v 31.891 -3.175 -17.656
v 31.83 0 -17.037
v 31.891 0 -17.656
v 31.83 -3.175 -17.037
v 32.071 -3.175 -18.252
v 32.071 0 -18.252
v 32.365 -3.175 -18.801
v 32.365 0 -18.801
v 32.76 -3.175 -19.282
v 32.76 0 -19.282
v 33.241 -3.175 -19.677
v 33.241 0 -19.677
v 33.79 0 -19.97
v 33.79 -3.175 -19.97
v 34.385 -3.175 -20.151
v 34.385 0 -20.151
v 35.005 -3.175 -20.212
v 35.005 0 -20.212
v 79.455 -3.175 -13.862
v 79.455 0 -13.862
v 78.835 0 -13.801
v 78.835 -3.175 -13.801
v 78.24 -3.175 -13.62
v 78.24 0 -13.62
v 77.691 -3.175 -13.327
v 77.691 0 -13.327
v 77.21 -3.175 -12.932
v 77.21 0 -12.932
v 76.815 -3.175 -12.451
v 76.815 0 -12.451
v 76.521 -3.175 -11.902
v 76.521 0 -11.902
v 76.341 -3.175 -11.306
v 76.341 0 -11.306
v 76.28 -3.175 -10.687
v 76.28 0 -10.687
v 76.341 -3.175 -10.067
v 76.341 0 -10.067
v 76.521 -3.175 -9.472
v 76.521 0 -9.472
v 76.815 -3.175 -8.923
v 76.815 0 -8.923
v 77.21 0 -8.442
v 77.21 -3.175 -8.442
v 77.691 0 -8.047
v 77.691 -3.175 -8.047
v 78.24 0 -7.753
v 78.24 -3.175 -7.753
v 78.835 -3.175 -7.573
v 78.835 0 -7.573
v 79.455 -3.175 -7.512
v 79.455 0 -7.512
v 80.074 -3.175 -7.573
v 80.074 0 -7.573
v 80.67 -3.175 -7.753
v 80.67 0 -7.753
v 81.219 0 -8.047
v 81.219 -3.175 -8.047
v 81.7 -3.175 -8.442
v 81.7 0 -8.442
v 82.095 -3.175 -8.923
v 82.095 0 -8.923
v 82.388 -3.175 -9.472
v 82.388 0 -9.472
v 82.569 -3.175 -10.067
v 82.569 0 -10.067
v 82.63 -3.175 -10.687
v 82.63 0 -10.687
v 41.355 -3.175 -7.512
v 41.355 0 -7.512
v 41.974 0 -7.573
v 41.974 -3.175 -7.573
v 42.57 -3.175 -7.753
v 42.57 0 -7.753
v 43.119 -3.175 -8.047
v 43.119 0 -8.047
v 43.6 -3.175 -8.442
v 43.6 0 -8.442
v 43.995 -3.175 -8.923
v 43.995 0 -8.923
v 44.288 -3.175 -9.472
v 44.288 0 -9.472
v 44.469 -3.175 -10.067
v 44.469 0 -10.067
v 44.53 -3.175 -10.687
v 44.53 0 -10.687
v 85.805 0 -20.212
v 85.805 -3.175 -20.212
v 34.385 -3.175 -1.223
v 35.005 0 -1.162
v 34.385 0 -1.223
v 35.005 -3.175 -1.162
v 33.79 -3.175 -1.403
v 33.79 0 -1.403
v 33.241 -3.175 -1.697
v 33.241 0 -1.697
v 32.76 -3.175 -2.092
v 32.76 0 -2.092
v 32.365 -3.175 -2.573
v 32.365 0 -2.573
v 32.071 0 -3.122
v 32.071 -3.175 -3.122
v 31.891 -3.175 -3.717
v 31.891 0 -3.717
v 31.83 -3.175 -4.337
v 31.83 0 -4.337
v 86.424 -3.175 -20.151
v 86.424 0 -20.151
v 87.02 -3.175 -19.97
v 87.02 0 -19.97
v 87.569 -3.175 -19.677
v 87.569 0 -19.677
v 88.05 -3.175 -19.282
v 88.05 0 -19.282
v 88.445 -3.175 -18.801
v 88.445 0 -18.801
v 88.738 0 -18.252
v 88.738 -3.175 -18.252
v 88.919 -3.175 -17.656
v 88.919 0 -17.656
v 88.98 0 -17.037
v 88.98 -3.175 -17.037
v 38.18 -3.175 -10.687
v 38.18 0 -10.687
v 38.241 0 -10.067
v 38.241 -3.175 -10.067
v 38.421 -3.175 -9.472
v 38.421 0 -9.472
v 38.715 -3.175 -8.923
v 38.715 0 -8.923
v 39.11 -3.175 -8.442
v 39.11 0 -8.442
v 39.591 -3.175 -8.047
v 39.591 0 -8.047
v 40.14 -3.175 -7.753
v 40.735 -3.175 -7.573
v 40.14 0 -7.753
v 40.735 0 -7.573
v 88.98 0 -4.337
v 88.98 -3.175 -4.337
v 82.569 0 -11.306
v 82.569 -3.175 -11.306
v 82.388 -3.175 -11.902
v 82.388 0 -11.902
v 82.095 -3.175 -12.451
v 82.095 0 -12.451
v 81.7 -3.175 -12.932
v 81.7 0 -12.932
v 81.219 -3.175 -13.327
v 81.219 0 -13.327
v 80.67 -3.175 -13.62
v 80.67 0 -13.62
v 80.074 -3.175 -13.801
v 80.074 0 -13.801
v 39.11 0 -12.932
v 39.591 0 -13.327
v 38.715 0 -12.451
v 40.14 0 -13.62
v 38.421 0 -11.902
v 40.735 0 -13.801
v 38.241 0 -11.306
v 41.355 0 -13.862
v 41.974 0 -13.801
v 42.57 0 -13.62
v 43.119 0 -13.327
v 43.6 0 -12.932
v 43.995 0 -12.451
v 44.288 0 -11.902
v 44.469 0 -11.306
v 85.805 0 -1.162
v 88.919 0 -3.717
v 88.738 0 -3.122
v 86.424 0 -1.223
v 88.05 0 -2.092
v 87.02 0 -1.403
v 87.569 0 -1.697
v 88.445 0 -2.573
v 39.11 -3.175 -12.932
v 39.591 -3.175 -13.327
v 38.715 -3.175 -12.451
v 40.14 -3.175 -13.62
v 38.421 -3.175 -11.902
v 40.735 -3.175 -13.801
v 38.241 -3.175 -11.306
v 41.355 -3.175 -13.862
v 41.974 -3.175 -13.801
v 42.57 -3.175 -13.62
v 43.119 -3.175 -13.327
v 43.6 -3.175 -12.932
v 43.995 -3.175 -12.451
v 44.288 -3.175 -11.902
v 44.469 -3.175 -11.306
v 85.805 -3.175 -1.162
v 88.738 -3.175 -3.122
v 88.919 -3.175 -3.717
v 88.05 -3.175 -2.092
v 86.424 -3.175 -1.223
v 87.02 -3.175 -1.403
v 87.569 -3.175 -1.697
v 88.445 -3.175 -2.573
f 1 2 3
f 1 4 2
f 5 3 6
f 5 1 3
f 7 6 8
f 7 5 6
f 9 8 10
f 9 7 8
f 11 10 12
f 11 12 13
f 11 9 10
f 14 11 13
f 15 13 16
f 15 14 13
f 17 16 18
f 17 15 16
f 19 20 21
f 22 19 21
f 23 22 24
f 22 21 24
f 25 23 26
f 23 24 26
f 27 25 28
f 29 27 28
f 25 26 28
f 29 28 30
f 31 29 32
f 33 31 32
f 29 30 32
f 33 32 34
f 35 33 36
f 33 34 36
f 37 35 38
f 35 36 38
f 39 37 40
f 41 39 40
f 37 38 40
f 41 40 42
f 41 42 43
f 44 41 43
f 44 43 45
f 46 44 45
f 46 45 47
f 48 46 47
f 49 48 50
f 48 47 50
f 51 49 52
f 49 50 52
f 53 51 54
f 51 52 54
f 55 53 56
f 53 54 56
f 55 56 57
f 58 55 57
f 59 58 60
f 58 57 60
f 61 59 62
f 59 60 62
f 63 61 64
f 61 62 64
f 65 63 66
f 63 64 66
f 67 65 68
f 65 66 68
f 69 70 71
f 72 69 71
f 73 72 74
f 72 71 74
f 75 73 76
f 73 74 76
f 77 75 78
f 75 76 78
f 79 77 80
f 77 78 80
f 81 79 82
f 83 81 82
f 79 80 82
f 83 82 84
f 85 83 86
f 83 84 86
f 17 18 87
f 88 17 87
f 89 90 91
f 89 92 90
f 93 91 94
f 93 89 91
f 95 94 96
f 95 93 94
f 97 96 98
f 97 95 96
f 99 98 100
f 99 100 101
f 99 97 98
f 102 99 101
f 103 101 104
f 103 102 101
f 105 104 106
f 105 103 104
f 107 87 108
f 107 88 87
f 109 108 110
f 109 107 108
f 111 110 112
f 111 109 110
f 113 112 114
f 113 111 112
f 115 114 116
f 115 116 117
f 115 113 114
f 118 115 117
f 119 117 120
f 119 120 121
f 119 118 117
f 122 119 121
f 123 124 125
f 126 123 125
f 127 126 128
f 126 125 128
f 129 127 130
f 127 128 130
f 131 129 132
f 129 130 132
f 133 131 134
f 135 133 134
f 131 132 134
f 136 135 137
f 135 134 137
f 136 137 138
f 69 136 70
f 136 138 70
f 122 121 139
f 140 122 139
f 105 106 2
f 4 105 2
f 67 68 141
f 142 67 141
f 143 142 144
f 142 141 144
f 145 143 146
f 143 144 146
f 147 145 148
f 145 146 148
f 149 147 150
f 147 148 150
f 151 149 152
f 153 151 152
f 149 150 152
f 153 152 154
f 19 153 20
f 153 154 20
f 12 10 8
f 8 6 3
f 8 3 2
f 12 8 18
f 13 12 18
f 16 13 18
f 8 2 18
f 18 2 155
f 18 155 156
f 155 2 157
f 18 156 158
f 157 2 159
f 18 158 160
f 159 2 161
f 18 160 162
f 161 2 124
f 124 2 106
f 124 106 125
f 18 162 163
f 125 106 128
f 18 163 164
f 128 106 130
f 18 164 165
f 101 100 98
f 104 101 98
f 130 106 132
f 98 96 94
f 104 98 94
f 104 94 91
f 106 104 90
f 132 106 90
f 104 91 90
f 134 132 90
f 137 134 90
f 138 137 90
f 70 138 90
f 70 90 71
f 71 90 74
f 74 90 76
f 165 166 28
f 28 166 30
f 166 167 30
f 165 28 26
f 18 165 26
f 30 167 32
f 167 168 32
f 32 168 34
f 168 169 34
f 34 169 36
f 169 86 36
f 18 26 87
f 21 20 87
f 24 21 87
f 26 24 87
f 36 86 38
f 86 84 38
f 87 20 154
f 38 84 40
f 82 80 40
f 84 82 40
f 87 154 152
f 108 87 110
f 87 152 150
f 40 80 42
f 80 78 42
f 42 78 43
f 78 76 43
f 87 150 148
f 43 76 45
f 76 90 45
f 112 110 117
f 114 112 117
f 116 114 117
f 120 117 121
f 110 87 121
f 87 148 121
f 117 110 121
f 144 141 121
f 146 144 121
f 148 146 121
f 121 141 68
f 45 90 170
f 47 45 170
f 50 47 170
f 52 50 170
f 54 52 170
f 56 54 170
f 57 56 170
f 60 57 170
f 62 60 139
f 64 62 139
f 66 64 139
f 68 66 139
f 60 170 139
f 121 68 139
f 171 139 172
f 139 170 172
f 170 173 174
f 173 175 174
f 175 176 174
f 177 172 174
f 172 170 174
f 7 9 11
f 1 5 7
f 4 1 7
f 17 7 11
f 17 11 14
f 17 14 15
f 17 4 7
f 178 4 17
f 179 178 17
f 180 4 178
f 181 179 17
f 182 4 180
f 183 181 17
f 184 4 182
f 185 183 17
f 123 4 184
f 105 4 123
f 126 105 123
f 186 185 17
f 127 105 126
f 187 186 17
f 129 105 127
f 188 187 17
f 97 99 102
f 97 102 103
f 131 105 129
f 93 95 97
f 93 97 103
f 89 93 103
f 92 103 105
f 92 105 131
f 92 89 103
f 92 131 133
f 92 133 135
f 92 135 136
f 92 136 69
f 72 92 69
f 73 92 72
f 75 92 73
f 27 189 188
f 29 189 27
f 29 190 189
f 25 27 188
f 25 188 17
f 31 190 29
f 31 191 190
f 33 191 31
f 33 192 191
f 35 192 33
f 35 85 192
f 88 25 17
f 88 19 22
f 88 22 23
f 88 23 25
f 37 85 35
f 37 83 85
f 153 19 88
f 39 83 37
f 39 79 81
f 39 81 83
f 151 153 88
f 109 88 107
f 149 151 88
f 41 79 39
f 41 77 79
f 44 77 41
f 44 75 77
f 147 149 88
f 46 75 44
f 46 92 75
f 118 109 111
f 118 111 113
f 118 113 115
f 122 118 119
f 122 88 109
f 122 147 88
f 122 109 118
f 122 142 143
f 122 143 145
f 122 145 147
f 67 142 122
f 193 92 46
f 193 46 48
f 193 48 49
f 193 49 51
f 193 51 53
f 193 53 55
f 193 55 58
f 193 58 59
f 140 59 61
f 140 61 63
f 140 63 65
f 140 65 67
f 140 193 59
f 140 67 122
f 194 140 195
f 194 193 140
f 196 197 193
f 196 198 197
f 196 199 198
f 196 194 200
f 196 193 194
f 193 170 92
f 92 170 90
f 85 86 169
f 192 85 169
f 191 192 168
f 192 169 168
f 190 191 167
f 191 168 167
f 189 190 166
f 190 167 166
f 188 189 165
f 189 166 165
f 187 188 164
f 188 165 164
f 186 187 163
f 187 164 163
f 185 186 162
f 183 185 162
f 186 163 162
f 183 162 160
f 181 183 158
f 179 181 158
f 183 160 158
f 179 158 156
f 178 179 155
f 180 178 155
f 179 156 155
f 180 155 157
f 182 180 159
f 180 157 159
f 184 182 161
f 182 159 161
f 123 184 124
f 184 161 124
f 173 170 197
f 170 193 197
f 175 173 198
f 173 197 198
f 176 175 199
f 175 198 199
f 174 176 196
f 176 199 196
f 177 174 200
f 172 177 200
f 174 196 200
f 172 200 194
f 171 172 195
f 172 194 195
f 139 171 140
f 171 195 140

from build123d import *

# Parameters (mm, degrees)
F1_DEPTH = 3.175
F2_R     = 3.175


with BuildPart() as f1:
    # F0 (on Front) → F1 (new body)
    with BuildSketch(Plane.XZ):
        with BuildLine():
            Line((88.979729, -1.161793), (41.354729, -1.161793))
            Line((41.354729, -1.161793), (41.354729, -7.511793))
            ThreePointArc((41.354729, -7.511793), (43.599793, -8.441729), (44.529729, -10.686793))
            ThreePointArc((44.529729, -10.686793), (41.354729, -13.861793), (38.179729, -10.686793))
            Line((38.179729, -10.686793), (31.829729, -10.686793))
            Line((31.829729, -10.686793), (31.829729, -20.211793))
            Line((31.829729, -20.211793), (79.454729, -20.211793))
            Line((79.454729, -20.211793), (79.454729, -13.861793))
            ThreePointArc((79.454729, -13.861793), (77.209664, -8.441729), (82.629729, -10.686793))
            Line((82.629729, -10.686793), (88.979729, -10.686793))
            Line((88.979729, -10.686793), (88.979729, -1.161793))
        make_face()
        with BuildLine():
            Line((41.354729, -1.161793), (31.829729, -1.161793))
            Line((31.829729, -1.161793), (31.829729, -10.686793))
            Line((31.829729, -10.686793), (38.179729, -10.686793))
            ThreePointArc((38.179729, -10.686793), (39.109664, -8.441729), (41.354729, -7.511793))
            Line((41.354729, -7.511793), (41.354729, -1.161793))
        make_face()
        with BuildLine():
            Line((88.979729, -20.211793), (88.979729, -10.686793))
            Line((88.979729, -10.686793), (82.629729, -10.686793))
            ThreePointArc((82.629729, -10.686793), (81.699793, -12.931858), (79.454729, -13.861793))
            Line((79.454729, -13.861793), (79.454729, -20.211793))
            Line((79.454729, -20.211793), (88.979729, -20.211793))
        make_face()
    extrude(amount=F1_DEPTH)

    # F2
    f2_edges = [f1.edges().sort_by_distance(p)[0] for p in [
        (31.829729, -1.5875, -1.161793),
        (31.829729, -1.5875, -20.211793),
        (88.979729, -1.5875, -20.211793),
        (88.979729, -1.5875, -1.161793),
    ]]
    fillet(f2_edges, radius=F2_R)


solid = f1.part
